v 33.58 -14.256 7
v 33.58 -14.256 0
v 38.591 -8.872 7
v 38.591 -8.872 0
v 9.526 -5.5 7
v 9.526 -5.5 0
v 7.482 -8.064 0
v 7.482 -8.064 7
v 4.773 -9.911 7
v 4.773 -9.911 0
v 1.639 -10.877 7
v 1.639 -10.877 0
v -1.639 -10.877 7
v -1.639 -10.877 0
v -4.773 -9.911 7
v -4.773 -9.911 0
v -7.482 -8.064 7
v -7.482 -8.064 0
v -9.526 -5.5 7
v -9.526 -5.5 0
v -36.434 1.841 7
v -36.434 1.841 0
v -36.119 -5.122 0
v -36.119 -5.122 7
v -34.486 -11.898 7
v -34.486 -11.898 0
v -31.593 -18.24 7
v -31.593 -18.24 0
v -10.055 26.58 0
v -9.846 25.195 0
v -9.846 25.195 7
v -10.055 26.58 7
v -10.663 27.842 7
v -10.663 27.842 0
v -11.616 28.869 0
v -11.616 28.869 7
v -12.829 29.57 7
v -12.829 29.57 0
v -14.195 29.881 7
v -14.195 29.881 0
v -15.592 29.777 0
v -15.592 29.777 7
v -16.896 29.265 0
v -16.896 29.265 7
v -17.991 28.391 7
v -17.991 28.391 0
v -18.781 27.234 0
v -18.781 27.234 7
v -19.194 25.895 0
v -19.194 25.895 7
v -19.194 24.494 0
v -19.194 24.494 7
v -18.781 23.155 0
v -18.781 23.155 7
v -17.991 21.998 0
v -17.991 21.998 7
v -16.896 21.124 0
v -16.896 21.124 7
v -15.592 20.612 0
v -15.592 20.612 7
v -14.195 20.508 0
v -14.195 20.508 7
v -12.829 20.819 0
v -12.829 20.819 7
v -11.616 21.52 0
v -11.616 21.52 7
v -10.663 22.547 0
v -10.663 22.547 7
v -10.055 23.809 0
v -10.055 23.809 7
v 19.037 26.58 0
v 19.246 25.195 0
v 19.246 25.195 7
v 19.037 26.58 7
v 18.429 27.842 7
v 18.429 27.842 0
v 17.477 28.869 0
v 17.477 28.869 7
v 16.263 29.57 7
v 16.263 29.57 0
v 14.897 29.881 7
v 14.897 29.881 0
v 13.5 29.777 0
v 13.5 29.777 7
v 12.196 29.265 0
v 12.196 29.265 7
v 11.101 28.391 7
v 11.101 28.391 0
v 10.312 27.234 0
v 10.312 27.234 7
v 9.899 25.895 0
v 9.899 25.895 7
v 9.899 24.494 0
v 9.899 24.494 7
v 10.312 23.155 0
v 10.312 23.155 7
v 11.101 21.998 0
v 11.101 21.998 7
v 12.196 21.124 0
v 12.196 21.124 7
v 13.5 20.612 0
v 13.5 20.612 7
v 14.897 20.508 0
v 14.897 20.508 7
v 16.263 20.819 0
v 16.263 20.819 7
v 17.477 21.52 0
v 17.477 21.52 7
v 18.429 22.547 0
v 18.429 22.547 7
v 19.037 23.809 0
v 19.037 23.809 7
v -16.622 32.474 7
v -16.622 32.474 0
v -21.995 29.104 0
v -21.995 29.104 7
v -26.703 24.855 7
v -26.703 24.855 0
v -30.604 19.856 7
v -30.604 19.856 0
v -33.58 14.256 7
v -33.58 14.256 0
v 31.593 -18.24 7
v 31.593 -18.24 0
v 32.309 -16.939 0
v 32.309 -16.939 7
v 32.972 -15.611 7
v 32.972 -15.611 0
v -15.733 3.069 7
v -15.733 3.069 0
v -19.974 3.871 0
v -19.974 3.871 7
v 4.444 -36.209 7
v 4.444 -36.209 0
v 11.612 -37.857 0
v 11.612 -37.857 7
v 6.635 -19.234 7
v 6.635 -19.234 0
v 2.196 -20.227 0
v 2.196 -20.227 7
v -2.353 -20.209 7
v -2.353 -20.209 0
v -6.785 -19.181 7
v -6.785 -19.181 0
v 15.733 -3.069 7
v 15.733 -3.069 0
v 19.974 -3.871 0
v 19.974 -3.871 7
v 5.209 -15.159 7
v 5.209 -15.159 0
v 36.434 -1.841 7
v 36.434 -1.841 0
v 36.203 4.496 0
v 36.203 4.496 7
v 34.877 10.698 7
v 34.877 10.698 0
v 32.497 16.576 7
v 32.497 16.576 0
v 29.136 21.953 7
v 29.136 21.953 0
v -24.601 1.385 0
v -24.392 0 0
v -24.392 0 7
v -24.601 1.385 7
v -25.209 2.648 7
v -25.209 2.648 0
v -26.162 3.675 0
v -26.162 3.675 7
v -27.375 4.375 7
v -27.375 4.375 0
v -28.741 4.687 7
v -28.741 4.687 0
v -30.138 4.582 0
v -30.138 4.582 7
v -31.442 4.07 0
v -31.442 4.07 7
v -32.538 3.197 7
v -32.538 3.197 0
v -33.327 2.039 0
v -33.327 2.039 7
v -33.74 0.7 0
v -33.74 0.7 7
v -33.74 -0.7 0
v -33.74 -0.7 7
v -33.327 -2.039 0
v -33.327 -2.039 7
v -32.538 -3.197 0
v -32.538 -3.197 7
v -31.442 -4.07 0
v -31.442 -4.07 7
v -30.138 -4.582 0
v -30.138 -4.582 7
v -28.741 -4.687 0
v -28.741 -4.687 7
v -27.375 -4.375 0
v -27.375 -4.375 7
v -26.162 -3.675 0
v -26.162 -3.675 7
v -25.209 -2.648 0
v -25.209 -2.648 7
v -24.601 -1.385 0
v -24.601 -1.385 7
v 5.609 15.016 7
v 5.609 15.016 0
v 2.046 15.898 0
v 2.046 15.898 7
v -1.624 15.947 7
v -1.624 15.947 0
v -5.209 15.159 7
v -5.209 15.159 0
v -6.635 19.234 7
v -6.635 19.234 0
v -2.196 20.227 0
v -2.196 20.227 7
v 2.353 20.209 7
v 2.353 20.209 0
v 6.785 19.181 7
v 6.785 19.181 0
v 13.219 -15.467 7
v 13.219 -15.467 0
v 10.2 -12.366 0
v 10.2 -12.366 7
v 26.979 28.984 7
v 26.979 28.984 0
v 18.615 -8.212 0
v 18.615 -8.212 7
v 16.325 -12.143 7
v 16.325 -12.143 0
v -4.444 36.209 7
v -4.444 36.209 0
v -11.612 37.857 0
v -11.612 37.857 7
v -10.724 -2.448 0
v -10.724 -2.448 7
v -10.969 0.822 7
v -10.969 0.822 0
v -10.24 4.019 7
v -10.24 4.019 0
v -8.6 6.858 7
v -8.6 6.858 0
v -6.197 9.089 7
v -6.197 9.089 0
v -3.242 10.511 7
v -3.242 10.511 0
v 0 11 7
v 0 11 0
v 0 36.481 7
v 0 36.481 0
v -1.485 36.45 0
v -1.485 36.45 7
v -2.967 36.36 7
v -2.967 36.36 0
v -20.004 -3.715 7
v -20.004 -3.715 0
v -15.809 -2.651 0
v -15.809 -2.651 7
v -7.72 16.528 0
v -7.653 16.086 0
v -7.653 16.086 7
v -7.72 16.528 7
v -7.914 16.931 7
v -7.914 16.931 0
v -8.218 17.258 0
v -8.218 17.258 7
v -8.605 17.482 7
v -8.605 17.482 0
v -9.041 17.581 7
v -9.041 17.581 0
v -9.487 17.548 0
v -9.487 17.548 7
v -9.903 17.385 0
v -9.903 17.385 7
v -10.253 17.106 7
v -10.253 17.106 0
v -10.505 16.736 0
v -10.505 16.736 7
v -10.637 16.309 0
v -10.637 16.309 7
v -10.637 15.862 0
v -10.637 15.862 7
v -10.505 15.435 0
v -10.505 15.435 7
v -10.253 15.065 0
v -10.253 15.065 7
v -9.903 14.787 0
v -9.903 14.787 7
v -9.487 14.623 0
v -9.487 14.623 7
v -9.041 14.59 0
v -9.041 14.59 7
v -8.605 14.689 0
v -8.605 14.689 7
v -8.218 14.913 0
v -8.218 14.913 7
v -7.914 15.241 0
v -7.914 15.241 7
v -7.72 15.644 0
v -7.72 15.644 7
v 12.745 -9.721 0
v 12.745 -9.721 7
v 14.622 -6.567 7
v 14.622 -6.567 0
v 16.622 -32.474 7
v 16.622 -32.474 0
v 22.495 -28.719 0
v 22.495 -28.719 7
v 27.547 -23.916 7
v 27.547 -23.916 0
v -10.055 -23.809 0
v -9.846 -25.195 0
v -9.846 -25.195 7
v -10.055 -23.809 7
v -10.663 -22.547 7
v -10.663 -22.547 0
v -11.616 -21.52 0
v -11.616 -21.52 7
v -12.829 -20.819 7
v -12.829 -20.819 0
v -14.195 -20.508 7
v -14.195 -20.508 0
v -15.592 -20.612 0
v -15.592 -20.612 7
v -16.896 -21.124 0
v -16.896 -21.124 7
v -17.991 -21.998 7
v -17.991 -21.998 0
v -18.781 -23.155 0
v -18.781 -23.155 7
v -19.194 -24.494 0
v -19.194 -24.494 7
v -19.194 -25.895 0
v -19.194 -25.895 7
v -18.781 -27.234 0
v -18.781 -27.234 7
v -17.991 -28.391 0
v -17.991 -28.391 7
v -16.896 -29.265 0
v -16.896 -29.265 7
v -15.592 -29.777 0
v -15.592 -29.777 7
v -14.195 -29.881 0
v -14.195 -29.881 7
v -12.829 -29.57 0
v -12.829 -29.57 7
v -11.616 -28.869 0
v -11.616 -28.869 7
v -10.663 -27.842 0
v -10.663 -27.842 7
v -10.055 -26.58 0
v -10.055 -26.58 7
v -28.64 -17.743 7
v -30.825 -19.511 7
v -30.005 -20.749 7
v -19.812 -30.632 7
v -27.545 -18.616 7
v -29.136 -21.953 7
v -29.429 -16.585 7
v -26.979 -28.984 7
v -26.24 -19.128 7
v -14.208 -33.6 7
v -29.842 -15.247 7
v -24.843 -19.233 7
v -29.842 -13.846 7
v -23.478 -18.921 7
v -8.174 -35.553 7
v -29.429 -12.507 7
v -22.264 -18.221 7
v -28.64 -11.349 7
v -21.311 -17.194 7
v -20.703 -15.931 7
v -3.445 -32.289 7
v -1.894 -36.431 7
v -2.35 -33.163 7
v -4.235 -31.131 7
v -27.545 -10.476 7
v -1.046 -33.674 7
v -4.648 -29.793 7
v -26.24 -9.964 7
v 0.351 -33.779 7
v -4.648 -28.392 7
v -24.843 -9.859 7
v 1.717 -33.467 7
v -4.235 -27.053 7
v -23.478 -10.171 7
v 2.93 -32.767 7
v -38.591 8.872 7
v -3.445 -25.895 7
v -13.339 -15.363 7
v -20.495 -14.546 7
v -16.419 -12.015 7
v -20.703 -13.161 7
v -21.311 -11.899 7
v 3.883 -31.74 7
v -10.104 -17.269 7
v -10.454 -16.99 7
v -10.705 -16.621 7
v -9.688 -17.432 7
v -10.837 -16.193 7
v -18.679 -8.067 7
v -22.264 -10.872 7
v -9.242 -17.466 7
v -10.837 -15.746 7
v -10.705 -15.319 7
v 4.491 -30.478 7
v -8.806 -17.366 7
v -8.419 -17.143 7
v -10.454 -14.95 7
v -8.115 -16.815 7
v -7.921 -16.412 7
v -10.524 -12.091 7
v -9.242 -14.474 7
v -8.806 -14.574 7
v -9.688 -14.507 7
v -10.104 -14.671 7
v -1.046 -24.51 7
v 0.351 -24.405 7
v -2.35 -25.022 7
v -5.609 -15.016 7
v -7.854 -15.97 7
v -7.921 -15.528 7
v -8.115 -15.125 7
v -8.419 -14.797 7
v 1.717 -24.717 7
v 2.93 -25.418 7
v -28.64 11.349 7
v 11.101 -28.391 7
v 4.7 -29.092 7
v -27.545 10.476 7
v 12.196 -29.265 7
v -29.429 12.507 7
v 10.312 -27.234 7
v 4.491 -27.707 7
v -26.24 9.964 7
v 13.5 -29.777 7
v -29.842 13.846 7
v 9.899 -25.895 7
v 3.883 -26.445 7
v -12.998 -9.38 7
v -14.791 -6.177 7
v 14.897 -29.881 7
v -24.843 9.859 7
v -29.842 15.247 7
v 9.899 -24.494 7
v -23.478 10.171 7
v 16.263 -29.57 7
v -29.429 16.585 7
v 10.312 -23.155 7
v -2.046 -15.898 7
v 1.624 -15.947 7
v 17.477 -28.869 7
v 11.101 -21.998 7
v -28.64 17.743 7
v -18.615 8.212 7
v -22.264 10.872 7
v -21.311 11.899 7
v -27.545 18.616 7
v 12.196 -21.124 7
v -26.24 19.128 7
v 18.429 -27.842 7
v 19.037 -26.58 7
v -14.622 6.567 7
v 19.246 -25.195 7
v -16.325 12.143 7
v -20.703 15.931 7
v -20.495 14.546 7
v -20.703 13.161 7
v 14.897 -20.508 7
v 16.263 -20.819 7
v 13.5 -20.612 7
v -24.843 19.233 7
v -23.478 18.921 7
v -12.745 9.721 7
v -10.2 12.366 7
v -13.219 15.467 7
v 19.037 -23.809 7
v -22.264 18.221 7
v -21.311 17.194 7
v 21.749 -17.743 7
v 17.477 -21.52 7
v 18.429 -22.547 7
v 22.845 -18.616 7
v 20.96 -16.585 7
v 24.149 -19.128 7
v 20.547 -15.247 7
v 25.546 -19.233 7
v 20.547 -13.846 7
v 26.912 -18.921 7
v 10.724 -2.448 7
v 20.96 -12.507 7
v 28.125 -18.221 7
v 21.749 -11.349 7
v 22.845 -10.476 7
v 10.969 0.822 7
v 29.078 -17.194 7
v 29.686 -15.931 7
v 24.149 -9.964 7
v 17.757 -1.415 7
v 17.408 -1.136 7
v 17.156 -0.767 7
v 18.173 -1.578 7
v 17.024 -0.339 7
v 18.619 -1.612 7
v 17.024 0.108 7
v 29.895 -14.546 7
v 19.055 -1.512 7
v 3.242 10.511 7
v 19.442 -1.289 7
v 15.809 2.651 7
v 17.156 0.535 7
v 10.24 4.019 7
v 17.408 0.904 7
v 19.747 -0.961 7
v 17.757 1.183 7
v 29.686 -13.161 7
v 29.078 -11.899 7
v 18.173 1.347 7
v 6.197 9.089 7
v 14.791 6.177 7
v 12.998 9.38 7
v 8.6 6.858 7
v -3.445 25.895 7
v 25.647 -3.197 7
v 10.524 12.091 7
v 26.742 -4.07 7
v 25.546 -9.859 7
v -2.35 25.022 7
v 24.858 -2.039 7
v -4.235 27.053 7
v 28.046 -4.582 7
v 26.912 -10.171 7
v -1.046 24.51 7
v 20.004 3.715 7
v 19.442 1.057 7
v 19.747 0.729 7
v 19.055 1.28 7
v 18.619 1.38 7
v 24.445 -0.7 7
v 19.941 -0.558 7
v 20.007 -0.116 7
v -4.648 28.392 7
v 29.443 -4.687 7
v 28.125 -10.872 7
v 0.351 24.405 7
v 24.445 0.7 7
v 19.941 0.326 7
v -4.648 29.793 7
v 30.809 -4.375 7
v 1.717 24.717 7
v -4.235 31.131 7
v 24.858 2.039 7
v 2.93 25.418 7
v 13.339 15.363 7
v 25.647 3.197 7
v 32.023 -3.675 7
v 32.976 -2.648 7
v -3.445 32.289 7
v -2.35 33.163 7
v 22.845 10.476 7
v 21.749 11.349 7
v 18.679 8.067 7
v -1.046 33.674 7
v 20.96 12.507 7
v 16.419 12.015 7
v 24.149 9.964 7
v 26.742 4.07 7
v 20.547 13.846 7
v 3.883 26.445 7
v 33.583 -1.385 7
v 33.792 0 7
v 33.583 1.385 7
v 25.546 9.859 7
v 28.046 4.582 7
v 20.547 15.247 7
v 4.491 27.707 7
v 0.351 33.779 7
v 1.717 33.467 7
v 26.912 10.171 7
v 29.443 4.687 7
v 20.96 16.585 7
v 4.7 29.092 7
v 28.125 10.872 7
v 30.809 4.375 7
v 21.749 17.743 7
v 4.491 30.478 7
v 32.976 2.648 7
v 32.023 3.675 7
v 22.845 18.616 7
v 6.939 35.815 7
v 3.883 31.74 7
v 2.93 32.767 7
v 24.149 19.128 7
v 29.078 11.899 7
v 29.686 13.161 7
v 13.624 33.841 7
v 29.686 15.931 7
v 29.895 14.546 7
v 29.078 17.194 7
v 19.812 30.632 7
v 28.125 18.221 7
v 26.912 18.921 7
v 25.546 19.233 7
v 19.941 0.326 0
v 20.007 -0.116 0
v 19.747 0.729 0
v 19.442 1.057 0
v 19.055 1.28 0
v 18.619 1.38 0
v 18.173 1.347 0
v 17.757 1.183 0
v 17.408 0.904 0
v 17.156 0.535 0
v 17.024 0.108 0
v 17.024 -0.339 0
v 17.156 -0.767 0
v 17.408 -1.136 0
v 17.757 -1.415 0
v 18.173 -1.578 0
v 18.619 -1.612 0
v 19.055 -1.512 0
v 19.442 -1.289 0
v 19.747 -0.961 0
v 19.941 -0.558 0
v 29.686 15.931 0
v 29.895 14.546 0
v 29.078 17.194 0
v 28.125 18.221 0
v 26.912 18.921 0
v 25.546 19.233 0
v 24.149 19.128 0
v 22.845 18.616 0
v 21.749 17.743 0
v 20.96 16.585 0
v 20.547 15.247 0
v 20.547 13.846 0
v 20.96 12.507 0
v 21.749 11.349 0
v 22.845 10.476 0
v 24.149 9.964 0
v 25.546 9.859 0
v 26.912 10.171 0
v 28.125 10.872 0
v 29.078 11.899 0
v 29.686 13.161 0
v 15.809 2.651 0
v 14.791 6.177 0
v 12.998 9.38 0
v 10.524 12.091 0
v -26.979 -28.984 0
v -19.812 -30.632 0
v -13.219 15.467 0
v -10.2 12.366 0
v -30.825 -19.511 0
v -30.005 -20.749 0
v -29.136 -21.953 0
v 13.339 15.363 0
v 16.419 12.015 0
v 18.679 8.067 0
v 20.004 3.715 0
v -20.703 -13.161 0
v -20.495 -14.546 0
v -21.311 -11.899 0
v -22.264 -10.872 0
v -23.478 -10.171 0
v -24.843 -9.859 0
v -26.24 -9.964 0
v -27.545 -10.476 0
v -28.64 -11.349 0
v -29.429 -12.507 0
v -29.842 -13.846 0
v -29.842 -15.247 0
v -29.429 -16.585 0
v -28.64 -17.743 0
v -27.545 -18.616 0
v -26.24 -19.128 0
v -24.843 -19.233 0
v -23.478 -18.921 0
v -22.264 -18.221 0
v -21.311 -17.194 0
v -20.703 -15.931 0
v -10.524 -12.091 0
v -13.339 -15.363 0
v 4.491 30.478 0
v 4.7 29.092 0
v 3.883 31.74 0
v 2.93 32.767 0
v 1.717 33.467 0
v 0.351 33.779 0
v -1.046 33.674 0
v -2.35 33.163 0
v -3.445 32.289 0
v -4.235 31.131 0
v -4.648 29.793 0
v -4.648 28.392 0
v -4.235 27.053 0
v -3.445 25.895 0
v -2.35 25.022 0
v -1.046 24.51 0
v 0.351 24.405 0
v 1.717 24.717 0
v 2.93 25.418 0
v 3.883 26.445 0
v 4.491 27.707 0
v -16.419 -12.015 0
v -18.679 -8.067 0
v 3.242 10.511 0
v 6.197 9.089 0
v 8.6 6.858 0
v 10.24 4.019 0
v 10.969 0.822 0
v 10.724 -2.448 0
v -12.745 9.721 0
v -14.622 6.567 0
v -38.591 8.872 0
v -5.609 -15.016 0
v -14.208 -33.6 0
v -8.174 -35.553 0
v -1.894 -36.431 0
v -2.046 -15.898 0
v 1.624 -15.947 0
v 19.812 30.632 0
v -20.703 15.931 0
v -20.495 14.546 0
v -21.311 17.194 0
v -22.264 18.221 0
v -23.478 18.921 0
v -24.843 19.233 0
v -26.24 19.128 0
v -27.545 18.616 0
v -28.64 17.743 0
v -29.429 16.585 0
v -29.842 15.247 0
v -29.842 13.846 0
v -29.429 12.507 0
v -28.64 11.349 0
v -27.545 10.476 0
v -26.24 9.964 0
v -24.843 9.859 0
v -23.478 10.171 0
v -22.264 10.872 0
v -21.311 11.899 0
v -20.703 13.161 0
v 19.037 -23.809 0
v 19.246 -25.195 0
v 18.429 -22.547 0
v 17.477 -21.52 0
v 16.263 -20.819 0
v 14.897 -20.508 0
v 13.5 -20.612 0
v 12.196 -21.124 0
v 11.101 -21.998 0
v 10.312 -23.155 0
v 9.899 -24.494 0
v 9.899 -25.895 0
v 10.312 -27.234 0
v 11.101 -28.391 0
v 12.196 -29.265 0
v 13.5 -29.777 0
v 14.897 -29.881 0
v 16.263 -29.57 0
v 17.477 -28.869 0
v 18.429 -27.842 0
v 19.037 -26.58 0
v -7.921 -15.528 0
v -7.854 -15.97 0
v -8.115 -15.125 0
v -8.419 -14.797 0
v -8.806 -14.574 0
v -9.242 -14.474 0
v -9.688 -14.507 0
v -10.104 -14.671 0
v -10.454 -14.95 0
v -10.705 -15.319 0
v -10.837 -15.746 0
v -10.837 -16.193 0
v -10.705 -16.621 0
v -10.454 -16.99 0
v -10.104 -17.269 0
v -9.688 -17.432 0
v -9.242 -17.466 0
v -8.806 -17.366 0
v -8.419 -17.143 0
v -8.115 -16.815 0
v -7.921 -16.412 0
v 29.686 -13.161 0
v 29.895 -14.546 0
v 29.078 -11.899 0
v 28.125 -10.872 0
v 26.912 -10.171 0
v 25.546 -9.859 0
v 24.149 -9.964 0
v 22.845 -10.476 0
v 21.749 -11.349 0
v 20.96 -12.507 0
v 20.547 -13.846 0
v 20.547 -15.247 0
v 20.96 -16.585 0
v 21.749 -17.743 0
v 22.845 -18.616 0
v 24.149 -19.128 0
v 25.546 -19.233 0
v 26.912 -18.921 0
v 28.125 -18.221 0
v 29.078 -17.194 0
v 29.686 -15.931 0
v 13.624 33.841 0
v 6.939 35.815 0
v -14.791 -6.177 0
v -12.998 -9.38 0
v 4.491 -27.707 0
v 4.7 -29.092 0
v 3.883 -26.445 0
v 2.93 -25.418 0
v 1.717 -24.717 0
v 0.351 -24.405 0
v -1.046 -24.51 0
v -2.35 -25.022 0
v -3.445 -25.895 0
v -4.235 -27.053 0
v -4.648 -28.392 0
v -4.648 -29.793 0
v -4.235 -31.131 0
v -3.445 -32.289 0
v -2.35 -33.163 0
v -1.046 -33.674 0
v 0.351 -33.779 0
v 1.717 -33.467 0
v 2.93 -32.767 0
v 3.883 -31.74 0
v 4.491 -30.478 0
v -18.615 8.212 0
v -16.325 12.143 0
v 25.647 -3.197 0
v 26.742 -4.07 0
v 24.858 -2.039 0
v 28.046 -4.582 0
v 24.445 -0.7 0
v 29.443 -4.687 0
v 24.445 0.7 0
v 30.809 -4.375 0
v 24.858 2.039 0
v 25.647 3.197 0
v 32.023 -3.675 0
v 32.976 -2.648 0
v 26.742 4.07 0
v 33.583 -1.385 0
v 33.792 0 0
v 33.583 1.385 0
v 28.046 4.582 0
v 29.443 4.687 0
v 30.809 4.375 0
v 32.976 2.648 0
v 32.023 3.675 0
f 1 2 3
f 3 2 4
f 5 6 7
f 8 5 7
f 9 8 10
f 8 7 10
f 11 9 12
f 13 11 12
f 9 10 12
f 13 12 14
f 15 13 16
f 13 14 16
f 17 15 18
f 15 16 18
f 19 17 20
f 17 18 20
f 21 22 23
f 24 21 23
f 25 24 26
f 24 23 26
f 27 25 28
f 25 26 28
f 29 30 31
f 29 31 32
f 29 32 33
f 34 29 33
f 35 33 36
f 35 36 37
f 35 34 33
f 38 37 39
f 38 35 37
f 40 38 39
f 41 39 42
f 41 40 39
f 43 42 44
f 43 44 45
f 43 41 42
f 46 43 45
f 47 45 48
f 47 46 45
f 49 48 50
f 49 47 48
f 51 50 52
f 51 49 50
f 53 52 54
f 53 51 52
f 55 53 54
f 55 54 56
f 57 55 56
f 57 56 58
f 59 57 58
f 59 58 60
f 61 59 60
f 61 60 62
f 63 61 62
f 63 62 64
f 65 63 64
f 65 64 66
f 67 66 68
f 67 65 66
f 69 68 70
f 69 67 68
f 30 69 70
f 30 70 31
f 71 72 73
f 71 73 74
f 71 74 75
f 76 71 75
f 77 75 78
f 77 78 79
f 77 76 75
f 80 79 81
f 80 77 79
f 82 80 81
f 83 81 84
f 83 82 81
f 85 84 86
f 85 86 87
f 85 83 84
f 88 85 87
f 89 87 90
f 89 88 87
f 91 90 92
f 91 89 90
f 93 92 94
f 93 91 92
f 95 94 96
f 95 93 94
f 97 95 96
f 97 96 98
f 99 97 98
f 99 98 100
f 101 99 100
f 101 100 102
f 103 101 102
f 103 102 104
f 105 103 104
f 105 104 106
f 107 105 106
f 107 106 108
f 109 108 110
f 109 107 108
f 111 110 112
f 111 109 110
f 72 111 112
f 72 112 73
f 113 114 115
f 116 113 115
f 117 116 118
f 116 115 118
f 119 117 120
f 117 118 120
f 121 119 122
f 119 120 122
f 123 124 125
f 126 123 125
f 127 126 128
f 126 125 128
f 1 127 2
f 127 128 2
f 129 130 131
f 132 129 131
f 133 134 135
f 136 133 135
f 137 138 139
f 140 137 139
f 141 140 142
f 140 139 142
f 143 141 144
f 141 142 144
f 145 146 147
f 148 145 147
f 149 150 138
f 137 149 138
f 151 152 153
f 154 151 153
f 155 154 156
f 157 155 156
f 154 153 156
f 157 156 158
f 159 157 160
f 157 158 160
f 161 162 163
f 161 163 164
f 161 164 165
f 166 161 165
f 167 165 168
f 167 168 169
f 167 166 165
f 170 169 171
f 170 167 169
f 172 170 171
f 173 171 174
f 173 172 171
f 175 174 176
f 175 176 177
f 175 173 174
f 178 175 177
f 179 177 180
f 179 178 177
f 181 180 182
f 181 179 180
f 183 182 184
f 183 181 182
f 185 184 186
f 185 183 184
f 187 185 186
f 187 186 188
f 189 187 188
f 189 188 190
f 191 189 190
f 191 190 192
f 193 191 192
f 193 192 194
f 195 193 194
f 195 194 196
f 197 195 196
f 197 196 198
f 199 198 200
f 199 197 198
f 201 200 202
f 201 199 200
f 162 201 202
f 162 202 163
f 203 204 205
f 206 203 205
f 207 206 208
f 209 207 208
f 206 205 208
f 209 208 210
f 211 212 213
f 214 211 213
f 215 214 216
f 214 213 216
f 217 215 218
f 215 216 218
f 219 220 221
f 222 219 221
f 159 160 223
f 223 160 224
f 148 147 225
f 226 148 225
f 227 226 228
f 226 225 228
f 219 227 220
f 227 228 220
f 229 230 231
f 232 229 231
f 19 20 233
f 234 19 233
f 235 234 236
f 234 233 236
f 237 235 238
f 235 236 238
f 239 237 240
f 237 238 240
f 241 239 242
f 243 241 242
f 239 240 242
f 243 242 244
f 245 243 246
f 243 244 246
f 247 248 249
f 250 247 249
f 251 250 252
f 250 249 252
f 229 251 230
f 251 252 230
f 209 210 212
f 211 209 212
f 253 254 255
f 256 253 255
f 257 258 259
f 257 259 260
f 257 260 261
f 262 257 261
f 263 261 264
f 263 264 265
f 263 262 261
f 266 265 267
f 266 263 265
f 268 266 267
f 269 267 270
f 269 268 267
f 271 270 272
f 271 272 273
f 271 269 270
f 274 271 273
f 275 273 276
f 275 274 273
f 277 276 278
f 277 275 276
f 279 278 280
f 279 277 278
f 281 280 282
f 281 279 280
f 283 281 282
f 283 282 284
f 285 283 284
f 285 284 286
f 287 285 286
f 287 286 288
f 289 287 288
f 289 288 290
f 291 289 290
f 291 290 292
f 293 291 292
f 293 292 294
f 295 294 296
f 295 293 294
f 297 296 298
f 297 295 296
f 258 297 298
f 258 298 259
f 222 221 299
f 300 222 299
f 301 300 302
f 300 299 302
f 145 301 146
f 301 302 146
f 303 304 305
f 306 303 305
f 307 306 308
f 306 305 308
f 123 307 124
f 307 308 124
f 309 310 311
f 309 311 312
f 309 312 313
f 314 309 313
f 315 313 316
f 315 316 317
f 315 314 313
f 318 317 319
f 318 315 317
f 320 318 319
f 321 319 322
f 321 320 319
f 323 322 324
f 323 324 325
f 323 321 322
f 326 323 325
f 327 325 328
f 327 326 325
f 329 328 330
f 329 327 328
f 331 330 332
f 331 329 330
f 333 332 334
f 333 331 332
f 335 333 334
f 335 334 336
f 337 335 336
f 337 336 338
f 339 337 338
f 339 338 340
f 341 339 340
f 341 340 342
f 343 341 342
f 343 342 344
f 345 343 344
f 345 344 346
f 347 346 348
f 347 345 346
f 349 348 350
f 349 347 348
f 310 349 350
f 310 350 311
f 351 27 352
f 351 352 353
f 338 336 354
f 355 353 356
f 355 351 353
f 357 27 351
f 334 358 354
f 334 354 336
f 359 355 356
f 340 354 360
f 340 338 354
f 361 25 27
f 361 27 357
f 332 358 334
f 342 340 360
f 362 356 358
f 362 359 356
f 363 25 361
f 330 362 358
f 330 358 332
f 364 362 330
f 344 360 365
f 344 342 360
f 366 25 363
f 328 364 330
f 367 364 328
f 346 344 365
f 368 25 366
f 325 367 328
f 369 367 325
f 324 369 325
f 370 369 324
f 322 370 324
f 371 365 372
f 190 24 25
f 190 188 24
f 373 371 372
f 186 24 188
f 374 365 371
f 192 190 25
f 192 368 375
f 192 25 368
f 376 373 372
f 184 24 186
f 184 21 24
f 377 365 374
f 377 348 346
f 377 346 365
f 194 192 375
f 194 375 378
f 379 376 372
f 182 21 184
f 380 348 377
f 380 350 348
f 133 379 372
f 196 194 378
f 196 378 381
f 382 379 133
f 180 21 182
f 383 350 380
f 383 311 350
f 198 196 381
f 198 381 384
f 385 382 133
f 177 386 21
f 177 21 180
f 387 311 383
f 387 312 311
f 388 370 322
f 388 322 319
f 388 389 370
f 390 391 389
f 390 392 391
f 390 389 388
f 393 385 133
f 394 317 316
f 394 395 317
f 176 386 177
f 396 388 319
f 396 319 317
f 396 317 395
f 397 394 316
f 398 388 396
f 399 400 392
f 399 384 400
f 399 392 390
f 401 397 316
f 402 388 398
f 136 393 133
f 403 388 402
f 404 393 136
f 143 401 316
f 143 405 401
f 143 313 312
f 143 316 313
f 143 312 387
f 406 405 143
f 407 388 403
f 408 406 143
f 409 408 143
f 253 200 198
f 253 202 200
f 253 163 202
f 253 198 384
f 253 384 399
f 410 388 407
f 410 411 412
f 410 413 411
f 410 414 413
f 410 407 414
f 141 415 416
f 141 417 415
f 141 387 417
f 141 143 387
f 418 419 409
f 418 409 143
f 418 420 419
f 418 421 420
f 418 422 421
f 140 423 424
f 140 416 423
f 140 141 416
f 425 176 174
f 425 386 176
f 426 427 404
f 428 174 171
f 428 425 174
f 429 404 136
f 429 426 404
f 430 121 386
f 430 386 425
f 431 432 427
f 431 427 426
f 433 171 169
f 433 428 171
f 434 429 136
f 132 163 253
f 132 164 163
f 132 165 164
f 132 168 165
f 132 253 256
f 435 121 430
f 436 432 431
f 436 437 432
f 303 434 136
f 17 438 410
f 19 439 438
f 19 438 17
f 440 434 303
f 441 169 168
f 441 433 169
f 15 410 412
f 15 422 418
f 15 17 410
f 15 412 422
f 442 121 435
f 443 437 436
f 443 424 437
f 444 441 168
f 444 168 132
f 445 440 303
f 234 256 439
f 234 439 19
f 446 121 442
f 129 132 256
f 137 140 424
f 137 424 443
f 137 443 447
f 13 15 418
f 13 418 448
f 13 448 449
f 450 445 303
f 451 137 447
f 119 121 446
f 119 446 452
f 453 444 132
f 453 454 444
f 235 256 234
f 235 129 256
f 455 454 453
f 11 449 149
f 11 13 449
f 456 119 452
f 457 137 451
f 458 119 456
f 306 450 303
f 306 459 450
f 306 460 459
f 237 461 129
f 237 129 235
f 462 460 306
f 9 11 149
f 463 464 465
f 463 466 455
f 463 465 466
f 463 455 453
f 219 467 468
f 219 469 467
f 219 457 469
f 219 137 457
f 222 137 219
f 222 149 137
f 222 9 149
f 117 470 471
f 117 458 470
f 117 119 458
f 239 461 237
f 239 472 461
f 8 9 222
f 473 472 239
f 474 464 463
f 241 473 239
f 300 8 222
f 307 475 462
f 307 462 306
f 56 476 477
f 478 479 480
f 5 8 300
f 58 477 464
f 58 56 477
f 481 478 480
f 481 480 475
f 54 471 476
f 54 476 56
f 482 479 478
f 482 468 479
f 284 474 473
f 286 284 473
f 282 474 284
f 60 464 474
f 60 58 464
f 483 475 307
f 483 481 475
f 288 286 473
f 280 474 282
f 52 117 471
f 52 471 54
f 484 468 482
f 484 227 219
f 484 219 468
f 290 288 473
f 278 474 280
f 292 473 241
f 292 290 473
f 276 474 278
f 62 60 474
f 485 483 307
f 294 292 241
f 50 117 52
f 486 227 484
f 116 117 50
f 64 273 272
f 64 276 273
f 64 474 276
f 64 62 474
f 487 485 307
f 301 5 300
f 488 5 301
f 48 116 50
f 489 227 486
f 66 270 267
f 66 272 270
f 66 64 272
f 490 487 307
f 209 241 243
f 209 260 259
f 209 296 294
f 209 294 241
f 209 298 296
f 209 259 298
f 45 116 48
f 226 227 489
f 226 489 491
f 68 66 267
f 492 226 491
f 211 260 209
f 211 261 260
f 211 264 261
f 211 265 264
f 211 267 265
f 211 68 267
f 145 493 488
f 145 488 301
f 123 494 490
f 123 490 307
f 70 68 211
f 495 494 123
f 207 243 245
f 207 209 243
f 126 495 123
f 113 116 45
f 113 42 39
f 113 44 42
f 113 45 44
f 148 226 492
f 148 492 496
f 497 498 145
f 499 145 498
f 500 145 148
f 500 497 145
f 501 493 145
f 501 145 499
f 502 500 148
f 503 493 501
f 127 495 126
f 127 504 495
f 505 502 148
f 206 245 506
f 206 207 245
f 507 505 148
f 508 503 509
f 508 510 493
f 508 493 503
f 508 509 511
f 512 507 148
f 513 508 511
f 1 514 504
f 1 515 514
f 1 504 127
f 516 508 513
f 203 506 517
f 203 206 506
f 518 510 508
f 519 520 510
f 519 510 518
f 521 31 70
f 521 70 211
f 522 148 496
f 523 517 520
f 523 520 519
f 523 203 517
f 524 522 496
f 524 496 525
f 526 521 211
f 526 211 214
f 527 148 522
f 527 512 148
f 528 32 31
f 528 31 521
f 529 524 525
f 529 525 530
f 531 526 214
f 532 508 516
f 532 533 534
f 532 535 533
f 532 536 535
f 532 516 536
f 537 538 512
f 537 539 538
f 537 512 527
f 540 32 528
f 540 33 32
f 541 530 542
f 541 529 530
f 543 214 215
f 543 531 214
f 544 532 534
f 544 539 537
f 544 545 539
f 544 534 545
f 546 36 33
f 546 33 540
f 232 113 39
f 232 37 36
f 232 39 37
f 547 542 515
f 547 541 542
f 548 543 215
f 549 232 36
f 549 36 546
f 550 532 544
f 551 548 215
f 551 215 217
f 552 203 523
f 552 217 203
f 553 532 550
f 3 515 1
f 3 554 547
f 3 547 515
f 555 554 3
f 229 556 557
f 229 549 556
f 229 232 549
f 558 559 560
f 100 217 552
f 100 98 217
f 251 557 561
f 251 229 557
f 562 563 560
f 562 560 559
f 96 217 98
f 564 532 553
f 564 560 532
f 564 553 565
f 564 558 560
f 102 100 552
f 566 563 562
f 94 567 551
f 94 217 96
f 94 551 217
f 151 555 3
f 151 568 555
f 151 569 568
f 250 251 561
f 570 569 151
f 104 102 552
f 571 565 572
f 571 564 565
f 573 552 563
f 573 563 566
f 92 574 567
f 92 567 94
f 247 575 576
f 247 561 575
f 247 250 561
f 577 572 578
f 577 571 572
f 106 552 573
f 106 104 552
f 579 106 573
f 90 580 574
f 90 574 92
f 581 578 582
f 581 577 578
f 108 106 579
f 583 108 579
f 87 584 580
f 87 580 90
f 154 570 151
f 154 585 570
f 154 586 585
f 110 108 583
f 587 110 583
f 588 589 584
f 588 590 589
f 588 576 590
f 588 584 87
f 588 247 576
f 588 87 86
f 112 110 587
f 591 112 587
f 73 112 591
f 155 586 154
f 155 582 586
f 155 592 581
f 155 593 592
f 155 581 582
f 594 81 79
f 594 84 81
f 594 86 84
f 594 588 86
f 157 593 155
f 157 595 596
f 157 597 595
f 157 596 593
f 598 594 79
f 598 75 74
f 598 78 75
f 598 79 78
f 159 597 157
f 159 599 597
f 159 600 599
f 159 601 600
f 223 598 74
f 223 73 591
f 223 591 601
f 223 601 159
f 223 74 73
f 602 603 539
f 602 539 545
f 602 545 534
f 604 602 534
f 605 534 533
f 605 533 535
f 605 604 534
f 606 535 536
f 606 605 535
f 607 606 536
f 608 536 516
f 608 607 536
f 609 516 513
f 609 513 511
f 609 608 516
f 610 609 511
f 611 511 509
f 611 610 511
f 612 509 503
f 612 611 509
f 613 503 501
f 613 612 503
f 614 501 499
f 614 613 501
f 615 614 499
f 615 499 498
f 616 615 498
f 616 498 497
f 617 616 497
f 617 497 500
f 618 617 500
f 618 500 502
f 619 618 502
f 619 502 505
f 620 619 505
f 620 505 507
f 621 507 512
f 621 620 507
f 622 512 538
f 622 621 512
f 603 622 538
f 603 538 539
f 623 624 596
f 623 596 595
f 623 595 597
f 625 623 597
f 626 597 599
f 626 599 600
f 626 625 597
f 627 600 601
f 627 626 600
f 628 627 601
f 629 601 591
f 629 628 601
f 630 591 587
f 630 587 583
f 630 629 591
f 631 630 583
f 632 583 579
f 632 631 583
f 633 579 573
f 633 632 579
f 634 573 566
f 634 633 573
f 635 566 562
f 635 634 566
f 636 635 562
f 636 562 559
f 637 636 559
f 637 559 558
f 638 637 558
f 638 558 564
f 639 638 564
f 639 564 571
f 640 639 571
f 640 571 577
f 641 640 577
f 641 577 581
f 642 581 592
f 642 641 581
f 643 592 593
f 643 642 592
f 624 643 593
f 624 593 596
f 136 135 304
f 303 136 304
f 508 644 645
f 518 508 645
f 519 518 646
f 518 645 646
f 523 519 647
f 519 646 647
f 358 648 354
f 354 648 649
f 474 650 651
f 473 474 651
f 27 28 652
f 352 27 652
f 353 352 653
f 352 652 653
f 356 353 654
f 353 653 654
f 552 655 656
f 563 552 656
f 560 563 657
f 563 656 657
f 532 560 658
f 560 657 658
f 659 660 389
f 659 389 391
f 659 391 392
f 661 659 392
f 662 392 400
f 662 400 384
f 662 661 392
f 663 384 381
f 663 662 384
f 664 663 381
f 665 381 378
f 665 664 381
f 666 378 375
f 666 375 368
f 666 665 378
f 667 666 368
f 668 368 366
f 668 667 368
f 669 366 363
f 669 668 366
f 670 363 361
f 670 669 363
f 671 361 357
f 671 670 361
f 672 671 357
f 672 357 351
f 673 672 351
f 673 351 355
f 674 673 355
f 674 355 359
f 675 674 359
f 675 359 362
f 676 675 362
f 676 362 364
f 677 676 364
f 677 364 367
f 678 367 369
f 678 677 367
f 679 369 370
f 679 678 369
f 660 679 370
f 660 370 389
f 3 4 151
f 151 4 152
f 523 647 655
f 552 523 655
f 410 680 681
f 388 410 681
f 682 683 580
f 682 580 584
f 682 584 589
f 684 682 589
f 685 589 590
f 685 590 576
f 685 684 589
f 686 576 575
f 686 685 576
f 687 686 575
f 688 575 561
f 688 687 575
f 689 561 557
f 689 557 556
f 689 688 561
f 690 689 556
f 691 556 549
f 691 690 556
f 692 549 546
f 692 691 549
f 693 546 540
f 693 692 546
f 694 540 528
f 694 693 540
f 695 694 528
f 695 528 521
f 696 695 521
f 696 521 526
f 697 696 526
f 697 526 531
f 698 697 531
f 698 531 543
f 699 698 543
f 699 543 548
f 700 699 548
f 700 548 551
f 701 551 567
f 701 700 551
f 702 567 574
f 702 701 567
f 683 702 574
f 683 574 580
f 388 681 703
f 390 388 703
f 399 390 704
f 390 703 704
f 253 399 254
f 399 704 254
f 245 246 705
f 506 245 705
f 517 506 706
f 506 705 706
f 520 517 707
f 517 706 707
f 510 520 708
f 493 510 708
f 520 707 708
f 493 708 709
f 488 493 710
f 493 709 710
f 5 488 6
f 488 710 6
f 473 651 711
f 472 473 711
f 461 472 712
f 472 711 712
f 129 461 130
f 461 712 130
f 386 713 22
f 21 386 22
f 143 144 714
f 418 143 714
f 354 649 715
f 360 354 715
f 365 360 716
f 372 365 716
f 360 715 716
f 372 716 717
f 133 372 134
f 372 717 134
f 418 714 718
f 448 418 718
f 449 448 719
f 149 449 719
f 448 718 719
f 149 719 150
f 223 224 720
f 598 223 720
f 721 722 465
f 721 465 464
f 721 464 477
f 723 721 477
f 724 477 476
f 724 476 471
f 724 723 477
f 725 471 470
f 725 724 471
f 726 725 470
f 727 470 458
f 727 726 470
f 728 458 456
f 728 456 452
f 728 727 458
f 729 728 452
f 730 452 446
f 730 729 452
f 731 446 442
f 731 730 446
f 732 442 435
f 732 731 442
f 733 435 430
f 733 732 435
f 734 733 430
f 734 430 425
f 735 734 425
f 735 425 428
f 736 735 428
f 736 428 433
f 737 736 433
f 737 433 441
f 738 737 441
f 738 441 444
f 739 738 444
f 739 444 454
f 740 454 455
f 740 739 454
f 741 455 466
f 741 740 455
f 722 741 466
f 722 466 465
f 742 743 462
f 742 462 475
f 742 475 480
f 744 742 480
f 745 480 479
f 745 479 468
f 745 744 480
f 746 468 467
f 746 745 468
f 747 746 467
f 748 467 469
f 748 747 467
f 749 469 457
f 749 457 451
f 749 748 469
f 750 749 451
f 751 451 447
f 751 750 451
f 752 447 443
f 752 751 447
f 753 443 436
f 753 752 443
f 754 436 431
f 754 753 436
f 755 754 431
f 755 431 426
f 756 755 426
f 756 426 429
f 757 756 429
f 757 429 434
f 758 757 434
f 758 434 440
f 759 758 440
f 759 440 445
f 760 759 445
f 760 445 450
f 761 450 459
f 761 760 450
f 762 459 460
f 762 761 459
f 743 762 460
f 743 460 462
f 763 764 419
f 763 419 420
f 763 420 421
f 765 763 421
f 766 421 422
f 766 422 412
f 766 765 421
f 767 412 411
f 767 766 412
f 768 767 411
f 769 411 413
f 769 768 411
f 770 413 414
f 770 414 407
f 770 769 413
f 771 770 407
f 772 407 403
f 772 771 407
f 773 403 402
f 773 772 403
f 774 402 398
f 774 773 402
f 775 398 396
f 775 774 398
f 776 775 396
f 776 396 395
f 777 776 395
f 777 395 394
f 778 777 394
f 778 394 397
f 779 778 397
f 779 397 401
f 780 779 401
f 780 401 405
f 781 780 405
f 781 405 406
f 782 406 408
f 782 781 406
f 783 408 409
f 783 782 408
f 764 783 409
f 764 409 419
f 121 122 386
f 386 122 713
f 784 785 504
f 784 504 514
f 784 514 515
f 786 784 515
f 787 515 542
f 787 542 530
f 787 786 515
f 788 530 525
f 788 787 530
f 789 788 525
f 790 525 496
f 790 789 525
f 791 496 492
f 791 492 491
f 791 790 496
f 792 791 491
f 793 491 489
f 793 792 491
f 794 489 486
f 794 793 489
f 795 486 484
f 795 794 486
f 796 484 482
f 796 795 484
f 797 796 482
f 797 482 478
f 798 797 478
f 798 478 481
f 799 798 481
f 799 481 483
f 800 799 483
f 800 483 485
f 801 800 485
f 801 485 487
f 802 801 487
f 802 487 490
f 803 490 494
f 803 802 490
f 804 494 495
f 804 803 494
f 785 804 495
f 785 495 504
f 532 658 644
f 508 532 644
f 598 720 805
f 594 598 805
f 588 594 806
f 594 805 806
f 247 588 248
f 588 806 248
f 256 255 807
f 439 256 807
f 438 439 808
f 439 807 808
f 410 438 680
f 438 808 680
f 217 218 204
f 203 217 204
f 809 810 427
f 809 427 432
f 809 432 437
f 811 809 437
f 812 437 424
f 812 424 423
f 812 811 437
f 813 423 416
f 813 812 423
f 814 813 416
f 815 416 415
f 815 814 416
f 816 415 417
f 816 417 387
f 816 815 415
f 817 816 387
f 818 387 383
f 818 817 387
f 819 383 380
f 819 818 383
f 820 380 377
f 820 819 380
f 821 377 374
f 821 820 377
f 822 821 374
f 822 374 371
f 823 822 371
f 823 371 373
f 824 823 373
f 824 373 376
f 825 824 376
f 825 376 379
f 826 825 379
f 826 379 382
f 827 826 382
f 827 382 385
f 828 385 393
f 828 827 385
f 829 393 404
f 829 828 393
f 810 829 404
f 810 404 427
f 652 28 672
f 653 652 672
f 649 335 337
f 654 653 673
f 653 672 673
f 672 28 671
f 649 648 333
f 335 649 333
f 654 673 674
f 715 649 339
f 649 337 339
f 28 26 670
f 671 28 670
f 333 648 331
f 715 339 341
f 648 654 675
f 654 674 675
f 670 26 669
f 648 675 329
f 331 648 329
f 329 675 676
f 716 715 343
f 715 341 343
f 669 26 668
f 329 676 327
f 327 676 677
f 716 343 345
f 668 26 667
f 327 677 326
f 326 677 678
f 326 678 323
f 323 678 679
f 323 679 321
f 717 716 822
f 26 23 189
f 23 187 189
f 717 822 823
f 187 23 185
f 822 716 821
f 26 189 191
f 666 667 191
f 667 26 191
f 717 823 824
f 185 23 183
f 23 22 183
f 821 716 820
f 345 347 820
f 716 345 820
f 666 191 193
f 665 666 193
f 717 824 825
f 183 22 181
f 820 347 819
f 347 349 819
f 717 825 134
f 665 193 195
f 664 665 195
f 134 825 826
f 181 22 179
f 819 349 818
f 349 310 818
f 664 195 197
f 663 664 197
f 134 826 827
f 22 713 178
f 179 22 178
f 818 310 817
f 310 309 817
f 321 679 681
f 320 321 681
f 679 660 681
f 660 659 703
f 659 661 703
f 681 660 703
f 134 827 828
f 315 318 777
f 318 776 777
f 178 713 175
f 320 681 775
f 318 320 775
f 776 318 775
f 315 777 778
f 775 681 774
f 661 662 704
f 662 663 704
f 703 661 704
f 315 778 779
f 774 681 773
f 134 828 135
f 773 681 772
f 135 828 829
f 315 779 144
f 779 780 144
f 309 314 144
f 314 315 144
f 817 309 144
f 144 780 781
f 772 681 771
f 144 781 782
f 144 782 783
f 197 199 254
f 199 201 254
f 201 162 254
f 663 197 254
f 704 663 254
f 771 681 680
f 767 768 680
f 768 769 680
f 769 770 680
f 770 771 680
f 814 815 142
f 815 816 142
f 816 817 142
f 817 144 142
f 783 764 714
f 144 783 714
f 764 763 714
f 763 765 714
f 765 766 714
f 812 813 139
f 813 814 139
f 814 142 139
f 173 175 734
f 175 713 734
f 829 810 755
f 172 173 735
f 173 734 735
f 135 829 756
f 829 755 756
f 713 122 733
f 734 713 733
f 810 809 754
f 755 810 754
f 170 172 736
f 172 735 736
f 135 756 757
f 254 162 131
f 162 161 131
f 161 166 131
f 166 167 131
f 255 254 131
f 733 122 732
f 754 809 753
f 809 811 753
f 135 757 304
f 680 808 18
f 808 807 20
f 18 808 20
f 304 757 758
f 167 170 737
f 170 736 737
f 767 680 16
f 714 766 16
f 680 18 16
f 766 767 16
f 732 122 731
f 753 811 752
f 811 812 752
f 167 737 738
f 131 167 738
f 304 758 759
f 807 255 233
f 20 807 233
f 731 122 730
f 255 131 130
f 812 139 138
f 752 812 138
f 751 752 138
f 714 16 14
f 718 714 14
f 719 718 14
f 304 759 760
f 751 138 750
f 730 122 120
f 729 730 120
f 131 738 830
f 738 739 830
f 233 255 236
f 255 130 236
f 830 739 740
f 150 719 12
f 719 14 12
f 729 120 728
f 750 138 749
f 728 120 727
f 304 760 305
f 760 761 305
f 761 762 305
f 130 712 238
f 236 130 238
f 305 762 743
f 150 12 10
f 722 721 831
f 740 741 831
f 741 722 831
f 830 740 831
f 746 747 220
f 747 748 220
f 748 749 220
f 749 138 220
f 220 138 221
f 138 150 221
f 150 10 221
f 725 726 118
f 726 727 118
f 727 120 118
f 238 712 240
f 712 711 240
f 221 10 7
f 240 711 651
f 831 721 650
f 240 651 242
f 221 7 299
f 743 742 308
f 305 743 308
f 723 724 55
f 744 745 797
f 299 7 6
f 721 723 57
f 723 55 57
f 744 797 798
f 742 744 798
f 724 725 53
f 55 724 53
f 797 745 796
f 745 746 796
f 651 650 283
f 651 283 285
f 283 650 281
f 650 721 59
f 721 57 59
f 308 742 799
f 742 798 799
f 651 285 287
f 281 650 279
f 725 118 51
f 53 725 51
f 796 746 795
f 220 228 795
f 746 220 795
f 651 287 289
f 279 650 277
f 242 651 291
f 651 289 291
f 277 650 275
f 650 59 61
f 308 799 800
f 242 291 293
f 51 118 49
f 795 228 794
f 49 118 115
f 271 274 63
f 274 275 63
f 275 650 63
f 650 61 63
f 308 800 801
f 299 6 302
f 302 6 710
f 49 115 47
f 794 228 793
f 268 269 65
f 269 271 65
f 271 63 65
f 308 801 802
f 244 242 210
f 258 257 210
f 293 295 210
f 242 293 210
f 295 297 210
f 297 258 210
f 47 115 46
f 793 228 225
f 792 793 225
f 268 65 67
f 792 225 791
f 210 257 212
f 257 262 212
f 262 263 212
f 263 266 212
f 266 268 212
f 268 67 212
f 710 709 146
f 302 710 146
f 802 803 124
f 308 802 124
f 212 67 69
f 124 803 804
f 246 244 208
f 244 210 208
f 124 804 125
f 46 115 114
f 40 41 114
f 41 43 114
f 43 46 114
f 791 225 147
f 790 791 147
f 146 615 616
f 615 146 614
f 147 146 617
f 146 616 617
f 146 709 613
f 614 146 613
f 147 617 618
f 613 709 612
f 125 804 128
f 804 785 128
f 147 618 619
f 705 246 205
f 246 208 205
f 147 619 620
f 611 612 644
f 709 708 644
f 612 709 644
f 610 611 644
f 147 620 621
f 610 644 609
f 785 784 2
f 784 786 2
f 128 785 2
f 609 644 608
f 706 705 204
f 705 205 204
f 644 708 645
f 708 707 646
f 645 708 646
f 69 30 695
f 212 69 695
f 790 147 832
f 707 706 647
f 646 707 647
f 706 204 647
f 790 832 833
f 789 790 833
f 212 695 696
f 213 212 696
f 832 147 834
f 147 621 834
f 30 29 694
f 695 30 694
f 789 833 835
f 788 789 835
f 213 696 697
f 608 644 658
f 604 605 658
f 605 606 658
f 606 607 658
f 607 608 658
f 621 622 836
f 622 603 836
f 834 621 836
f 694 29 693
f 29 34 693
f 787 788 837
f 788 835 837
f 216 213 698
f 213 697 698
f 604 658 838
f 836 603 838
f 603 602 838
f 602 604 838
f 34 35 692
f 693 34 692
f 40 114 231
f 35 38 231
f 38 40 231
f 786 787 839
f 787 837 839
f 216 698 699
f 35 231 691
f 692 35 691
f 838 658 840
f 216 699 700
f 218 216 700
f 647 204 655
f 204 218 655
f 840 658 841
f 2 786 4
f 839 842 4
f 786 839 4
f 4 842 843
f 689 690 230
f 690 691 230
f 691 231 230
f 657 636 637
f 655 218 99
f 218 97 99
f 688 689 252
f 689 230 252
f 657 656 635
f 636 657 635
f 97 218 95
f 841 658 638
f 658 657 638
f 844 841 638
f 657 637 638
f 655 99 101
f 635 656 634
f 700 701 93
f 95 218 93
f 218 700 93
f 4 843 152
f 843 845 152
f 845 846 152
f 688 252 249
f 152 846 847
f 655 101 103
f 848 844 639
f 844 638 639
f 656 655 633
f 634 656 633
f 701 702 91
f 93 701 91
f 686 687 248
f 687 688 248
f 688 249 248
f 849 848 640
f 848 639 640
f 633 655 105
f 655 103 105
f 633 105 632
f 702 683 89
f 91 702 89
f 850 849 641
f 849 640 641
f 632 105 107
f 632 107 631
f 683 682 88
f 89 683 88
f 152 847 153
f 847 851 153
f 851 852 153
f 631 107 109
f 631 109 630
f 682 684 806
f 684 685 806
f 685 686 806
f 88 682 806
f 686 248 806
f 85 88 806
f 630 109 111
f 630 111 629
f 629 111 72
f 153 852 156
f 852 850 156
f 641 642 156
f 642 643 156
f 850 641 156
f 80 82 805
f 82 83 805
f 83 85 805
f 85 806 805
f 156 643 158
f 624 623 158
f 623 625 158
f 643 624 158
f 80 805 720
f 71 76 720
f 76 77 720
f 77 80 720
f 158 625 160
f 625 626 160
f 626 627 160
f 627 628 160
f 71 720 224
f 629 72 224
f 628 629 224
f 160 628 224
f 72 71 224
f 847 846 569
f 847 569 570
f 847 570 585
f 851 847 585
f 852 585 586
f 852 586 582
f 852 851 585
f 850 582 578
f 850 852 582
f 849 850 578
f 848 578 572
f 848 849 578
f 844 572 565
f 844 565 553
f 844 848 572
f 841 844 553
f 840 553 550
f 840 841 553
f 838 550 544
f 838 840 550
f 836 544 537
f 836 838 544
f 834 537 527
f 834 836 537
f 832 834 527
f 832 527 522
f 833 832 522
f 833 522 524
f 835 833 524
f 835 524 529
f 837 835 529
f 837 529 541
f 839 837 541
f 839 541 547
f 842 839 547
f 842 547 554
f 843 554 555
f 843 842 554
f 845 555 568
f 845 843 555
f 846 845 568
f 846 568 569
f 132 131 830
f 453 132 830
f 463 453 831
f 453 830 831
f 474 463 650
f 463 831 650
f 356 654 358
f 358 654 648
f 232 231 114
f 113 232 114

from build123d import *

# Parameters (mm, degrees)
F0_R     = 4.7
F0_R_2   = 1.5
F1_DEPTH = 7


with BuildPart() as f1:
    # F0 (on Top) → F1 (new body)
    with BuildSketch(Plane.XY):
        with BuildLine():
            Line((-26.979165, -28.984375), (-19.81169, -30.632258))
            ThreePointArc((-19.81169, -30.632258), (-8.174057, -35.553103), (4.444148, -36.208947))
            Line((4.444148, -36.208947), (11.611623, -37.85683))
            Line((11.611623, -37.85683), (16.622468, -32.473556))
            ThreePointArc((16.622468, -32.473556), (25.136294, -26.438703), (31.593175, -18.240328))
            ThreePointArc((31.593175, -18.240328), (32.647405, -16.278367), (33.579942, -14.255729))
            Line((33.579942, -14.255729), (38.590788, -8.872455))
            Line((38.590788, -8.872455), (36.434159, -1.841298))
            ThreePointArc((36.434159, -1.841298), (34.876919, 10.69761), (29.135794, 21.953219))
            Line((29.135794, 21.953219), (26.979165, 28.984375))
            Line((26.979165, 28.984375), (19.81169, 30.632258))
            ThreePointArc((19.81169, 30.632258), (10.328442, 34.988021), (0, 36.480657))
            ThreePointArc((0, 36.480657), (-2.226223, 36.412666), (-4.444148, 36.208947))
            Line((-4.444148, 36.208947), (-11.611623, 37.85683))
            Line((-11.611623, 37.85683), (-16.622468, 32.473556))
            ThreePointArc((-16.622468, 32.473556), (-26.702862, 24.855492), (-33.579942, 14.255729))
            Line((-33.579942, 14.255729), (-38.590788, 8.872455))
            Line((-38.590788, 8.872455), (-36.434159, 1.841298))
            ThreePointArc((-36.434159, 1.841298), (-35.464736, -8.549317), (-31.593175, -18.240328))
            ThreePointArc((-31.593175, -18.240328), (-30.421182, -20.134299), (-29.135794, -21.953219))
            Line((-29.135794, -21.953219), (-26.979165, -28.984375))
        make_face()
        with Locations((-14.546111, -25.194604)):
            Circle(F0_R, mode=Mode.SUBTRACT)
        with Locations((-25.194604, -14.546111)):
            Circle(F0_R, mode=Mode.SUBTRACT)
        with Locations((-29.092222, 0)):
            Circle(F0_R, mode=Mode.SUBTRACT)
        with Locations((-9.353936, -15.969821)):
            Circle(F0_R_2, mode=Mode.SUBTRACT)
        with BuildLine():
            Line((-6.784947, -19.181266), (-5.608941, -15.016094))
            ThreePointArc((-5.608941, -15.016094), (-0.212424, -16.028044), (5.209015, -15.159468))
            Line((5.209015, -15.159468), (6.635095, -19.233615))
            ThreePointArc((6.635095, -19.233615), (-0.079366, -20.345765), (-6.784947, -19.181266))
        make_face(mode=Mode.SUBTRACT)
        with BuildLine():
            Line((-20.003937, -3.714697), (-15.80879, -2.650562))
            ThreePointArc((-15.80879, -2.650562), (-13.986905, -7.830057), (-10.523976, -12.090874))
            Line((-10.523976, -12.090874), (-13.339252, -15.362969))
            ThreePointArc((-13.339252, -15.362969), (-17.659632, -10.104149), (-20.003937, -3.714697))
        make_face(mode=Mode.SUBTRACT)
        with Locations((0, -29.092222)):
            Circle(F0_R, mode=Mode.SUBTRACT)
        with Locations((14.546111, -25.194604)):
            Circle(F0_R, mode=Mode.SUBTRACT)
        with BuildLine():
            ThreePointArc((9.526279, -5.5), (0, -11), (-9.526279, -5.5))
            ThreePointArc((-9.526279, -5.5), (-9.526279, 5.5), (0, 11))
            ThreePointArc((0, 11), (9.526279, 5.5), (9.526279, -5.5))
        make_face(mode=Mode.SUBTRACT)
        with BuildLine():
            Line((13.21899, -15.466569), (10.199849, -12.365532))
            ThreePointArc((10.199849, -12.365532), (13.774481, -8.197987), (15.732992, -3.068594))
            Line((15.732992, -3.068594), (19.974347, -3.870647))
            ThreePointArc((19.974347, -3.870647), (17.580266, -10.241616), (13.21899, -15.466569))
        make_face(mode=Mode.SUBTRACT)
        with Locations((18.507238, -0.115835)):
            Circle(F0_R_2, mode=Mode.SUBTRACT)
        with Locations((25.194604, -14.546111)):
            Circle(F0_R, mode=Mode.SUBTRACT)
        with Locations((29.092222, 0)):
            Circle(F0_R, mode=Mode.SUBTRACT)
        with Locations((-25.194604, 14.546111)):
            Circle(F0_R, mode=Mode.SUBTRACT)
        with BuildLine():
            Line((-13.21899, 15.466569), (-10.199849, 12.365532))
            ThreePointArc((-10.199849, 12.365532), (-13.774481, 8.197987), (-15.732992, 3.068594))
            Line((-15.732992, 3.068594), (-19.974347, 3.870647))
            ThreePointArc((-19.974347, 3.870647), (-17.580266, 10.241616), (-13.21899, 15.466569))
        make_face(mode=Mode.SUBTRACT)
        with Locations((-9.153303, 16.085656)):
            Circle(F0_R_2, mode=Mode.SUBTRACT)
        with Locations((-14.546111, 25.194604)):
            Circle(F0_R, mode=Mode.SUBTRACT)
        with BuildLine():
            Line((20.003937, 3.714697), (15.80879, 2.650562))
            ThreePointArc((15.80879, 2.650562), (13.986905, 7.830057), (10.523976, 12.090874))
            Line((10.523976, 12.090874), (13.339252, 15.362969))
            ThreePointArc((13.339252, 15.362969), (17.659632, 10.104149), (20.003937, 3.714697))
        make_face(mode=Mode.SUBTRACT)
        with BuildLine():
            ThreePointArc((-6.635095, 19.233615), (0.079366, 20.345765), (6.784947, 19.181266))
            Line((6.784947, 19.181266), (5.608941, 15.016094))
            ThreePointArc((5.608941, 15.016094), (0.212424, 16.028044), (-5.209015, 15.159468))
            Line((-5.209015, 15.159468), (-6.635095, 19.233615))
        make_face(mode=Mode.SUBTRACT)
        with Locations((25.194604, 14.546111)):
            Circle(F0_R, mode=Mode.SUBTRACT)
        with Locations((14.546111, 25.194604)):
            Circle(F0_R, mode=Mode.SUBTRACT)
        with Locations((0, 29.092222)):
            Circle(F0_R, mode=Mode.SUBTRACT)
    extrude(amount=F1_DEPTH)


solid = f1.part
